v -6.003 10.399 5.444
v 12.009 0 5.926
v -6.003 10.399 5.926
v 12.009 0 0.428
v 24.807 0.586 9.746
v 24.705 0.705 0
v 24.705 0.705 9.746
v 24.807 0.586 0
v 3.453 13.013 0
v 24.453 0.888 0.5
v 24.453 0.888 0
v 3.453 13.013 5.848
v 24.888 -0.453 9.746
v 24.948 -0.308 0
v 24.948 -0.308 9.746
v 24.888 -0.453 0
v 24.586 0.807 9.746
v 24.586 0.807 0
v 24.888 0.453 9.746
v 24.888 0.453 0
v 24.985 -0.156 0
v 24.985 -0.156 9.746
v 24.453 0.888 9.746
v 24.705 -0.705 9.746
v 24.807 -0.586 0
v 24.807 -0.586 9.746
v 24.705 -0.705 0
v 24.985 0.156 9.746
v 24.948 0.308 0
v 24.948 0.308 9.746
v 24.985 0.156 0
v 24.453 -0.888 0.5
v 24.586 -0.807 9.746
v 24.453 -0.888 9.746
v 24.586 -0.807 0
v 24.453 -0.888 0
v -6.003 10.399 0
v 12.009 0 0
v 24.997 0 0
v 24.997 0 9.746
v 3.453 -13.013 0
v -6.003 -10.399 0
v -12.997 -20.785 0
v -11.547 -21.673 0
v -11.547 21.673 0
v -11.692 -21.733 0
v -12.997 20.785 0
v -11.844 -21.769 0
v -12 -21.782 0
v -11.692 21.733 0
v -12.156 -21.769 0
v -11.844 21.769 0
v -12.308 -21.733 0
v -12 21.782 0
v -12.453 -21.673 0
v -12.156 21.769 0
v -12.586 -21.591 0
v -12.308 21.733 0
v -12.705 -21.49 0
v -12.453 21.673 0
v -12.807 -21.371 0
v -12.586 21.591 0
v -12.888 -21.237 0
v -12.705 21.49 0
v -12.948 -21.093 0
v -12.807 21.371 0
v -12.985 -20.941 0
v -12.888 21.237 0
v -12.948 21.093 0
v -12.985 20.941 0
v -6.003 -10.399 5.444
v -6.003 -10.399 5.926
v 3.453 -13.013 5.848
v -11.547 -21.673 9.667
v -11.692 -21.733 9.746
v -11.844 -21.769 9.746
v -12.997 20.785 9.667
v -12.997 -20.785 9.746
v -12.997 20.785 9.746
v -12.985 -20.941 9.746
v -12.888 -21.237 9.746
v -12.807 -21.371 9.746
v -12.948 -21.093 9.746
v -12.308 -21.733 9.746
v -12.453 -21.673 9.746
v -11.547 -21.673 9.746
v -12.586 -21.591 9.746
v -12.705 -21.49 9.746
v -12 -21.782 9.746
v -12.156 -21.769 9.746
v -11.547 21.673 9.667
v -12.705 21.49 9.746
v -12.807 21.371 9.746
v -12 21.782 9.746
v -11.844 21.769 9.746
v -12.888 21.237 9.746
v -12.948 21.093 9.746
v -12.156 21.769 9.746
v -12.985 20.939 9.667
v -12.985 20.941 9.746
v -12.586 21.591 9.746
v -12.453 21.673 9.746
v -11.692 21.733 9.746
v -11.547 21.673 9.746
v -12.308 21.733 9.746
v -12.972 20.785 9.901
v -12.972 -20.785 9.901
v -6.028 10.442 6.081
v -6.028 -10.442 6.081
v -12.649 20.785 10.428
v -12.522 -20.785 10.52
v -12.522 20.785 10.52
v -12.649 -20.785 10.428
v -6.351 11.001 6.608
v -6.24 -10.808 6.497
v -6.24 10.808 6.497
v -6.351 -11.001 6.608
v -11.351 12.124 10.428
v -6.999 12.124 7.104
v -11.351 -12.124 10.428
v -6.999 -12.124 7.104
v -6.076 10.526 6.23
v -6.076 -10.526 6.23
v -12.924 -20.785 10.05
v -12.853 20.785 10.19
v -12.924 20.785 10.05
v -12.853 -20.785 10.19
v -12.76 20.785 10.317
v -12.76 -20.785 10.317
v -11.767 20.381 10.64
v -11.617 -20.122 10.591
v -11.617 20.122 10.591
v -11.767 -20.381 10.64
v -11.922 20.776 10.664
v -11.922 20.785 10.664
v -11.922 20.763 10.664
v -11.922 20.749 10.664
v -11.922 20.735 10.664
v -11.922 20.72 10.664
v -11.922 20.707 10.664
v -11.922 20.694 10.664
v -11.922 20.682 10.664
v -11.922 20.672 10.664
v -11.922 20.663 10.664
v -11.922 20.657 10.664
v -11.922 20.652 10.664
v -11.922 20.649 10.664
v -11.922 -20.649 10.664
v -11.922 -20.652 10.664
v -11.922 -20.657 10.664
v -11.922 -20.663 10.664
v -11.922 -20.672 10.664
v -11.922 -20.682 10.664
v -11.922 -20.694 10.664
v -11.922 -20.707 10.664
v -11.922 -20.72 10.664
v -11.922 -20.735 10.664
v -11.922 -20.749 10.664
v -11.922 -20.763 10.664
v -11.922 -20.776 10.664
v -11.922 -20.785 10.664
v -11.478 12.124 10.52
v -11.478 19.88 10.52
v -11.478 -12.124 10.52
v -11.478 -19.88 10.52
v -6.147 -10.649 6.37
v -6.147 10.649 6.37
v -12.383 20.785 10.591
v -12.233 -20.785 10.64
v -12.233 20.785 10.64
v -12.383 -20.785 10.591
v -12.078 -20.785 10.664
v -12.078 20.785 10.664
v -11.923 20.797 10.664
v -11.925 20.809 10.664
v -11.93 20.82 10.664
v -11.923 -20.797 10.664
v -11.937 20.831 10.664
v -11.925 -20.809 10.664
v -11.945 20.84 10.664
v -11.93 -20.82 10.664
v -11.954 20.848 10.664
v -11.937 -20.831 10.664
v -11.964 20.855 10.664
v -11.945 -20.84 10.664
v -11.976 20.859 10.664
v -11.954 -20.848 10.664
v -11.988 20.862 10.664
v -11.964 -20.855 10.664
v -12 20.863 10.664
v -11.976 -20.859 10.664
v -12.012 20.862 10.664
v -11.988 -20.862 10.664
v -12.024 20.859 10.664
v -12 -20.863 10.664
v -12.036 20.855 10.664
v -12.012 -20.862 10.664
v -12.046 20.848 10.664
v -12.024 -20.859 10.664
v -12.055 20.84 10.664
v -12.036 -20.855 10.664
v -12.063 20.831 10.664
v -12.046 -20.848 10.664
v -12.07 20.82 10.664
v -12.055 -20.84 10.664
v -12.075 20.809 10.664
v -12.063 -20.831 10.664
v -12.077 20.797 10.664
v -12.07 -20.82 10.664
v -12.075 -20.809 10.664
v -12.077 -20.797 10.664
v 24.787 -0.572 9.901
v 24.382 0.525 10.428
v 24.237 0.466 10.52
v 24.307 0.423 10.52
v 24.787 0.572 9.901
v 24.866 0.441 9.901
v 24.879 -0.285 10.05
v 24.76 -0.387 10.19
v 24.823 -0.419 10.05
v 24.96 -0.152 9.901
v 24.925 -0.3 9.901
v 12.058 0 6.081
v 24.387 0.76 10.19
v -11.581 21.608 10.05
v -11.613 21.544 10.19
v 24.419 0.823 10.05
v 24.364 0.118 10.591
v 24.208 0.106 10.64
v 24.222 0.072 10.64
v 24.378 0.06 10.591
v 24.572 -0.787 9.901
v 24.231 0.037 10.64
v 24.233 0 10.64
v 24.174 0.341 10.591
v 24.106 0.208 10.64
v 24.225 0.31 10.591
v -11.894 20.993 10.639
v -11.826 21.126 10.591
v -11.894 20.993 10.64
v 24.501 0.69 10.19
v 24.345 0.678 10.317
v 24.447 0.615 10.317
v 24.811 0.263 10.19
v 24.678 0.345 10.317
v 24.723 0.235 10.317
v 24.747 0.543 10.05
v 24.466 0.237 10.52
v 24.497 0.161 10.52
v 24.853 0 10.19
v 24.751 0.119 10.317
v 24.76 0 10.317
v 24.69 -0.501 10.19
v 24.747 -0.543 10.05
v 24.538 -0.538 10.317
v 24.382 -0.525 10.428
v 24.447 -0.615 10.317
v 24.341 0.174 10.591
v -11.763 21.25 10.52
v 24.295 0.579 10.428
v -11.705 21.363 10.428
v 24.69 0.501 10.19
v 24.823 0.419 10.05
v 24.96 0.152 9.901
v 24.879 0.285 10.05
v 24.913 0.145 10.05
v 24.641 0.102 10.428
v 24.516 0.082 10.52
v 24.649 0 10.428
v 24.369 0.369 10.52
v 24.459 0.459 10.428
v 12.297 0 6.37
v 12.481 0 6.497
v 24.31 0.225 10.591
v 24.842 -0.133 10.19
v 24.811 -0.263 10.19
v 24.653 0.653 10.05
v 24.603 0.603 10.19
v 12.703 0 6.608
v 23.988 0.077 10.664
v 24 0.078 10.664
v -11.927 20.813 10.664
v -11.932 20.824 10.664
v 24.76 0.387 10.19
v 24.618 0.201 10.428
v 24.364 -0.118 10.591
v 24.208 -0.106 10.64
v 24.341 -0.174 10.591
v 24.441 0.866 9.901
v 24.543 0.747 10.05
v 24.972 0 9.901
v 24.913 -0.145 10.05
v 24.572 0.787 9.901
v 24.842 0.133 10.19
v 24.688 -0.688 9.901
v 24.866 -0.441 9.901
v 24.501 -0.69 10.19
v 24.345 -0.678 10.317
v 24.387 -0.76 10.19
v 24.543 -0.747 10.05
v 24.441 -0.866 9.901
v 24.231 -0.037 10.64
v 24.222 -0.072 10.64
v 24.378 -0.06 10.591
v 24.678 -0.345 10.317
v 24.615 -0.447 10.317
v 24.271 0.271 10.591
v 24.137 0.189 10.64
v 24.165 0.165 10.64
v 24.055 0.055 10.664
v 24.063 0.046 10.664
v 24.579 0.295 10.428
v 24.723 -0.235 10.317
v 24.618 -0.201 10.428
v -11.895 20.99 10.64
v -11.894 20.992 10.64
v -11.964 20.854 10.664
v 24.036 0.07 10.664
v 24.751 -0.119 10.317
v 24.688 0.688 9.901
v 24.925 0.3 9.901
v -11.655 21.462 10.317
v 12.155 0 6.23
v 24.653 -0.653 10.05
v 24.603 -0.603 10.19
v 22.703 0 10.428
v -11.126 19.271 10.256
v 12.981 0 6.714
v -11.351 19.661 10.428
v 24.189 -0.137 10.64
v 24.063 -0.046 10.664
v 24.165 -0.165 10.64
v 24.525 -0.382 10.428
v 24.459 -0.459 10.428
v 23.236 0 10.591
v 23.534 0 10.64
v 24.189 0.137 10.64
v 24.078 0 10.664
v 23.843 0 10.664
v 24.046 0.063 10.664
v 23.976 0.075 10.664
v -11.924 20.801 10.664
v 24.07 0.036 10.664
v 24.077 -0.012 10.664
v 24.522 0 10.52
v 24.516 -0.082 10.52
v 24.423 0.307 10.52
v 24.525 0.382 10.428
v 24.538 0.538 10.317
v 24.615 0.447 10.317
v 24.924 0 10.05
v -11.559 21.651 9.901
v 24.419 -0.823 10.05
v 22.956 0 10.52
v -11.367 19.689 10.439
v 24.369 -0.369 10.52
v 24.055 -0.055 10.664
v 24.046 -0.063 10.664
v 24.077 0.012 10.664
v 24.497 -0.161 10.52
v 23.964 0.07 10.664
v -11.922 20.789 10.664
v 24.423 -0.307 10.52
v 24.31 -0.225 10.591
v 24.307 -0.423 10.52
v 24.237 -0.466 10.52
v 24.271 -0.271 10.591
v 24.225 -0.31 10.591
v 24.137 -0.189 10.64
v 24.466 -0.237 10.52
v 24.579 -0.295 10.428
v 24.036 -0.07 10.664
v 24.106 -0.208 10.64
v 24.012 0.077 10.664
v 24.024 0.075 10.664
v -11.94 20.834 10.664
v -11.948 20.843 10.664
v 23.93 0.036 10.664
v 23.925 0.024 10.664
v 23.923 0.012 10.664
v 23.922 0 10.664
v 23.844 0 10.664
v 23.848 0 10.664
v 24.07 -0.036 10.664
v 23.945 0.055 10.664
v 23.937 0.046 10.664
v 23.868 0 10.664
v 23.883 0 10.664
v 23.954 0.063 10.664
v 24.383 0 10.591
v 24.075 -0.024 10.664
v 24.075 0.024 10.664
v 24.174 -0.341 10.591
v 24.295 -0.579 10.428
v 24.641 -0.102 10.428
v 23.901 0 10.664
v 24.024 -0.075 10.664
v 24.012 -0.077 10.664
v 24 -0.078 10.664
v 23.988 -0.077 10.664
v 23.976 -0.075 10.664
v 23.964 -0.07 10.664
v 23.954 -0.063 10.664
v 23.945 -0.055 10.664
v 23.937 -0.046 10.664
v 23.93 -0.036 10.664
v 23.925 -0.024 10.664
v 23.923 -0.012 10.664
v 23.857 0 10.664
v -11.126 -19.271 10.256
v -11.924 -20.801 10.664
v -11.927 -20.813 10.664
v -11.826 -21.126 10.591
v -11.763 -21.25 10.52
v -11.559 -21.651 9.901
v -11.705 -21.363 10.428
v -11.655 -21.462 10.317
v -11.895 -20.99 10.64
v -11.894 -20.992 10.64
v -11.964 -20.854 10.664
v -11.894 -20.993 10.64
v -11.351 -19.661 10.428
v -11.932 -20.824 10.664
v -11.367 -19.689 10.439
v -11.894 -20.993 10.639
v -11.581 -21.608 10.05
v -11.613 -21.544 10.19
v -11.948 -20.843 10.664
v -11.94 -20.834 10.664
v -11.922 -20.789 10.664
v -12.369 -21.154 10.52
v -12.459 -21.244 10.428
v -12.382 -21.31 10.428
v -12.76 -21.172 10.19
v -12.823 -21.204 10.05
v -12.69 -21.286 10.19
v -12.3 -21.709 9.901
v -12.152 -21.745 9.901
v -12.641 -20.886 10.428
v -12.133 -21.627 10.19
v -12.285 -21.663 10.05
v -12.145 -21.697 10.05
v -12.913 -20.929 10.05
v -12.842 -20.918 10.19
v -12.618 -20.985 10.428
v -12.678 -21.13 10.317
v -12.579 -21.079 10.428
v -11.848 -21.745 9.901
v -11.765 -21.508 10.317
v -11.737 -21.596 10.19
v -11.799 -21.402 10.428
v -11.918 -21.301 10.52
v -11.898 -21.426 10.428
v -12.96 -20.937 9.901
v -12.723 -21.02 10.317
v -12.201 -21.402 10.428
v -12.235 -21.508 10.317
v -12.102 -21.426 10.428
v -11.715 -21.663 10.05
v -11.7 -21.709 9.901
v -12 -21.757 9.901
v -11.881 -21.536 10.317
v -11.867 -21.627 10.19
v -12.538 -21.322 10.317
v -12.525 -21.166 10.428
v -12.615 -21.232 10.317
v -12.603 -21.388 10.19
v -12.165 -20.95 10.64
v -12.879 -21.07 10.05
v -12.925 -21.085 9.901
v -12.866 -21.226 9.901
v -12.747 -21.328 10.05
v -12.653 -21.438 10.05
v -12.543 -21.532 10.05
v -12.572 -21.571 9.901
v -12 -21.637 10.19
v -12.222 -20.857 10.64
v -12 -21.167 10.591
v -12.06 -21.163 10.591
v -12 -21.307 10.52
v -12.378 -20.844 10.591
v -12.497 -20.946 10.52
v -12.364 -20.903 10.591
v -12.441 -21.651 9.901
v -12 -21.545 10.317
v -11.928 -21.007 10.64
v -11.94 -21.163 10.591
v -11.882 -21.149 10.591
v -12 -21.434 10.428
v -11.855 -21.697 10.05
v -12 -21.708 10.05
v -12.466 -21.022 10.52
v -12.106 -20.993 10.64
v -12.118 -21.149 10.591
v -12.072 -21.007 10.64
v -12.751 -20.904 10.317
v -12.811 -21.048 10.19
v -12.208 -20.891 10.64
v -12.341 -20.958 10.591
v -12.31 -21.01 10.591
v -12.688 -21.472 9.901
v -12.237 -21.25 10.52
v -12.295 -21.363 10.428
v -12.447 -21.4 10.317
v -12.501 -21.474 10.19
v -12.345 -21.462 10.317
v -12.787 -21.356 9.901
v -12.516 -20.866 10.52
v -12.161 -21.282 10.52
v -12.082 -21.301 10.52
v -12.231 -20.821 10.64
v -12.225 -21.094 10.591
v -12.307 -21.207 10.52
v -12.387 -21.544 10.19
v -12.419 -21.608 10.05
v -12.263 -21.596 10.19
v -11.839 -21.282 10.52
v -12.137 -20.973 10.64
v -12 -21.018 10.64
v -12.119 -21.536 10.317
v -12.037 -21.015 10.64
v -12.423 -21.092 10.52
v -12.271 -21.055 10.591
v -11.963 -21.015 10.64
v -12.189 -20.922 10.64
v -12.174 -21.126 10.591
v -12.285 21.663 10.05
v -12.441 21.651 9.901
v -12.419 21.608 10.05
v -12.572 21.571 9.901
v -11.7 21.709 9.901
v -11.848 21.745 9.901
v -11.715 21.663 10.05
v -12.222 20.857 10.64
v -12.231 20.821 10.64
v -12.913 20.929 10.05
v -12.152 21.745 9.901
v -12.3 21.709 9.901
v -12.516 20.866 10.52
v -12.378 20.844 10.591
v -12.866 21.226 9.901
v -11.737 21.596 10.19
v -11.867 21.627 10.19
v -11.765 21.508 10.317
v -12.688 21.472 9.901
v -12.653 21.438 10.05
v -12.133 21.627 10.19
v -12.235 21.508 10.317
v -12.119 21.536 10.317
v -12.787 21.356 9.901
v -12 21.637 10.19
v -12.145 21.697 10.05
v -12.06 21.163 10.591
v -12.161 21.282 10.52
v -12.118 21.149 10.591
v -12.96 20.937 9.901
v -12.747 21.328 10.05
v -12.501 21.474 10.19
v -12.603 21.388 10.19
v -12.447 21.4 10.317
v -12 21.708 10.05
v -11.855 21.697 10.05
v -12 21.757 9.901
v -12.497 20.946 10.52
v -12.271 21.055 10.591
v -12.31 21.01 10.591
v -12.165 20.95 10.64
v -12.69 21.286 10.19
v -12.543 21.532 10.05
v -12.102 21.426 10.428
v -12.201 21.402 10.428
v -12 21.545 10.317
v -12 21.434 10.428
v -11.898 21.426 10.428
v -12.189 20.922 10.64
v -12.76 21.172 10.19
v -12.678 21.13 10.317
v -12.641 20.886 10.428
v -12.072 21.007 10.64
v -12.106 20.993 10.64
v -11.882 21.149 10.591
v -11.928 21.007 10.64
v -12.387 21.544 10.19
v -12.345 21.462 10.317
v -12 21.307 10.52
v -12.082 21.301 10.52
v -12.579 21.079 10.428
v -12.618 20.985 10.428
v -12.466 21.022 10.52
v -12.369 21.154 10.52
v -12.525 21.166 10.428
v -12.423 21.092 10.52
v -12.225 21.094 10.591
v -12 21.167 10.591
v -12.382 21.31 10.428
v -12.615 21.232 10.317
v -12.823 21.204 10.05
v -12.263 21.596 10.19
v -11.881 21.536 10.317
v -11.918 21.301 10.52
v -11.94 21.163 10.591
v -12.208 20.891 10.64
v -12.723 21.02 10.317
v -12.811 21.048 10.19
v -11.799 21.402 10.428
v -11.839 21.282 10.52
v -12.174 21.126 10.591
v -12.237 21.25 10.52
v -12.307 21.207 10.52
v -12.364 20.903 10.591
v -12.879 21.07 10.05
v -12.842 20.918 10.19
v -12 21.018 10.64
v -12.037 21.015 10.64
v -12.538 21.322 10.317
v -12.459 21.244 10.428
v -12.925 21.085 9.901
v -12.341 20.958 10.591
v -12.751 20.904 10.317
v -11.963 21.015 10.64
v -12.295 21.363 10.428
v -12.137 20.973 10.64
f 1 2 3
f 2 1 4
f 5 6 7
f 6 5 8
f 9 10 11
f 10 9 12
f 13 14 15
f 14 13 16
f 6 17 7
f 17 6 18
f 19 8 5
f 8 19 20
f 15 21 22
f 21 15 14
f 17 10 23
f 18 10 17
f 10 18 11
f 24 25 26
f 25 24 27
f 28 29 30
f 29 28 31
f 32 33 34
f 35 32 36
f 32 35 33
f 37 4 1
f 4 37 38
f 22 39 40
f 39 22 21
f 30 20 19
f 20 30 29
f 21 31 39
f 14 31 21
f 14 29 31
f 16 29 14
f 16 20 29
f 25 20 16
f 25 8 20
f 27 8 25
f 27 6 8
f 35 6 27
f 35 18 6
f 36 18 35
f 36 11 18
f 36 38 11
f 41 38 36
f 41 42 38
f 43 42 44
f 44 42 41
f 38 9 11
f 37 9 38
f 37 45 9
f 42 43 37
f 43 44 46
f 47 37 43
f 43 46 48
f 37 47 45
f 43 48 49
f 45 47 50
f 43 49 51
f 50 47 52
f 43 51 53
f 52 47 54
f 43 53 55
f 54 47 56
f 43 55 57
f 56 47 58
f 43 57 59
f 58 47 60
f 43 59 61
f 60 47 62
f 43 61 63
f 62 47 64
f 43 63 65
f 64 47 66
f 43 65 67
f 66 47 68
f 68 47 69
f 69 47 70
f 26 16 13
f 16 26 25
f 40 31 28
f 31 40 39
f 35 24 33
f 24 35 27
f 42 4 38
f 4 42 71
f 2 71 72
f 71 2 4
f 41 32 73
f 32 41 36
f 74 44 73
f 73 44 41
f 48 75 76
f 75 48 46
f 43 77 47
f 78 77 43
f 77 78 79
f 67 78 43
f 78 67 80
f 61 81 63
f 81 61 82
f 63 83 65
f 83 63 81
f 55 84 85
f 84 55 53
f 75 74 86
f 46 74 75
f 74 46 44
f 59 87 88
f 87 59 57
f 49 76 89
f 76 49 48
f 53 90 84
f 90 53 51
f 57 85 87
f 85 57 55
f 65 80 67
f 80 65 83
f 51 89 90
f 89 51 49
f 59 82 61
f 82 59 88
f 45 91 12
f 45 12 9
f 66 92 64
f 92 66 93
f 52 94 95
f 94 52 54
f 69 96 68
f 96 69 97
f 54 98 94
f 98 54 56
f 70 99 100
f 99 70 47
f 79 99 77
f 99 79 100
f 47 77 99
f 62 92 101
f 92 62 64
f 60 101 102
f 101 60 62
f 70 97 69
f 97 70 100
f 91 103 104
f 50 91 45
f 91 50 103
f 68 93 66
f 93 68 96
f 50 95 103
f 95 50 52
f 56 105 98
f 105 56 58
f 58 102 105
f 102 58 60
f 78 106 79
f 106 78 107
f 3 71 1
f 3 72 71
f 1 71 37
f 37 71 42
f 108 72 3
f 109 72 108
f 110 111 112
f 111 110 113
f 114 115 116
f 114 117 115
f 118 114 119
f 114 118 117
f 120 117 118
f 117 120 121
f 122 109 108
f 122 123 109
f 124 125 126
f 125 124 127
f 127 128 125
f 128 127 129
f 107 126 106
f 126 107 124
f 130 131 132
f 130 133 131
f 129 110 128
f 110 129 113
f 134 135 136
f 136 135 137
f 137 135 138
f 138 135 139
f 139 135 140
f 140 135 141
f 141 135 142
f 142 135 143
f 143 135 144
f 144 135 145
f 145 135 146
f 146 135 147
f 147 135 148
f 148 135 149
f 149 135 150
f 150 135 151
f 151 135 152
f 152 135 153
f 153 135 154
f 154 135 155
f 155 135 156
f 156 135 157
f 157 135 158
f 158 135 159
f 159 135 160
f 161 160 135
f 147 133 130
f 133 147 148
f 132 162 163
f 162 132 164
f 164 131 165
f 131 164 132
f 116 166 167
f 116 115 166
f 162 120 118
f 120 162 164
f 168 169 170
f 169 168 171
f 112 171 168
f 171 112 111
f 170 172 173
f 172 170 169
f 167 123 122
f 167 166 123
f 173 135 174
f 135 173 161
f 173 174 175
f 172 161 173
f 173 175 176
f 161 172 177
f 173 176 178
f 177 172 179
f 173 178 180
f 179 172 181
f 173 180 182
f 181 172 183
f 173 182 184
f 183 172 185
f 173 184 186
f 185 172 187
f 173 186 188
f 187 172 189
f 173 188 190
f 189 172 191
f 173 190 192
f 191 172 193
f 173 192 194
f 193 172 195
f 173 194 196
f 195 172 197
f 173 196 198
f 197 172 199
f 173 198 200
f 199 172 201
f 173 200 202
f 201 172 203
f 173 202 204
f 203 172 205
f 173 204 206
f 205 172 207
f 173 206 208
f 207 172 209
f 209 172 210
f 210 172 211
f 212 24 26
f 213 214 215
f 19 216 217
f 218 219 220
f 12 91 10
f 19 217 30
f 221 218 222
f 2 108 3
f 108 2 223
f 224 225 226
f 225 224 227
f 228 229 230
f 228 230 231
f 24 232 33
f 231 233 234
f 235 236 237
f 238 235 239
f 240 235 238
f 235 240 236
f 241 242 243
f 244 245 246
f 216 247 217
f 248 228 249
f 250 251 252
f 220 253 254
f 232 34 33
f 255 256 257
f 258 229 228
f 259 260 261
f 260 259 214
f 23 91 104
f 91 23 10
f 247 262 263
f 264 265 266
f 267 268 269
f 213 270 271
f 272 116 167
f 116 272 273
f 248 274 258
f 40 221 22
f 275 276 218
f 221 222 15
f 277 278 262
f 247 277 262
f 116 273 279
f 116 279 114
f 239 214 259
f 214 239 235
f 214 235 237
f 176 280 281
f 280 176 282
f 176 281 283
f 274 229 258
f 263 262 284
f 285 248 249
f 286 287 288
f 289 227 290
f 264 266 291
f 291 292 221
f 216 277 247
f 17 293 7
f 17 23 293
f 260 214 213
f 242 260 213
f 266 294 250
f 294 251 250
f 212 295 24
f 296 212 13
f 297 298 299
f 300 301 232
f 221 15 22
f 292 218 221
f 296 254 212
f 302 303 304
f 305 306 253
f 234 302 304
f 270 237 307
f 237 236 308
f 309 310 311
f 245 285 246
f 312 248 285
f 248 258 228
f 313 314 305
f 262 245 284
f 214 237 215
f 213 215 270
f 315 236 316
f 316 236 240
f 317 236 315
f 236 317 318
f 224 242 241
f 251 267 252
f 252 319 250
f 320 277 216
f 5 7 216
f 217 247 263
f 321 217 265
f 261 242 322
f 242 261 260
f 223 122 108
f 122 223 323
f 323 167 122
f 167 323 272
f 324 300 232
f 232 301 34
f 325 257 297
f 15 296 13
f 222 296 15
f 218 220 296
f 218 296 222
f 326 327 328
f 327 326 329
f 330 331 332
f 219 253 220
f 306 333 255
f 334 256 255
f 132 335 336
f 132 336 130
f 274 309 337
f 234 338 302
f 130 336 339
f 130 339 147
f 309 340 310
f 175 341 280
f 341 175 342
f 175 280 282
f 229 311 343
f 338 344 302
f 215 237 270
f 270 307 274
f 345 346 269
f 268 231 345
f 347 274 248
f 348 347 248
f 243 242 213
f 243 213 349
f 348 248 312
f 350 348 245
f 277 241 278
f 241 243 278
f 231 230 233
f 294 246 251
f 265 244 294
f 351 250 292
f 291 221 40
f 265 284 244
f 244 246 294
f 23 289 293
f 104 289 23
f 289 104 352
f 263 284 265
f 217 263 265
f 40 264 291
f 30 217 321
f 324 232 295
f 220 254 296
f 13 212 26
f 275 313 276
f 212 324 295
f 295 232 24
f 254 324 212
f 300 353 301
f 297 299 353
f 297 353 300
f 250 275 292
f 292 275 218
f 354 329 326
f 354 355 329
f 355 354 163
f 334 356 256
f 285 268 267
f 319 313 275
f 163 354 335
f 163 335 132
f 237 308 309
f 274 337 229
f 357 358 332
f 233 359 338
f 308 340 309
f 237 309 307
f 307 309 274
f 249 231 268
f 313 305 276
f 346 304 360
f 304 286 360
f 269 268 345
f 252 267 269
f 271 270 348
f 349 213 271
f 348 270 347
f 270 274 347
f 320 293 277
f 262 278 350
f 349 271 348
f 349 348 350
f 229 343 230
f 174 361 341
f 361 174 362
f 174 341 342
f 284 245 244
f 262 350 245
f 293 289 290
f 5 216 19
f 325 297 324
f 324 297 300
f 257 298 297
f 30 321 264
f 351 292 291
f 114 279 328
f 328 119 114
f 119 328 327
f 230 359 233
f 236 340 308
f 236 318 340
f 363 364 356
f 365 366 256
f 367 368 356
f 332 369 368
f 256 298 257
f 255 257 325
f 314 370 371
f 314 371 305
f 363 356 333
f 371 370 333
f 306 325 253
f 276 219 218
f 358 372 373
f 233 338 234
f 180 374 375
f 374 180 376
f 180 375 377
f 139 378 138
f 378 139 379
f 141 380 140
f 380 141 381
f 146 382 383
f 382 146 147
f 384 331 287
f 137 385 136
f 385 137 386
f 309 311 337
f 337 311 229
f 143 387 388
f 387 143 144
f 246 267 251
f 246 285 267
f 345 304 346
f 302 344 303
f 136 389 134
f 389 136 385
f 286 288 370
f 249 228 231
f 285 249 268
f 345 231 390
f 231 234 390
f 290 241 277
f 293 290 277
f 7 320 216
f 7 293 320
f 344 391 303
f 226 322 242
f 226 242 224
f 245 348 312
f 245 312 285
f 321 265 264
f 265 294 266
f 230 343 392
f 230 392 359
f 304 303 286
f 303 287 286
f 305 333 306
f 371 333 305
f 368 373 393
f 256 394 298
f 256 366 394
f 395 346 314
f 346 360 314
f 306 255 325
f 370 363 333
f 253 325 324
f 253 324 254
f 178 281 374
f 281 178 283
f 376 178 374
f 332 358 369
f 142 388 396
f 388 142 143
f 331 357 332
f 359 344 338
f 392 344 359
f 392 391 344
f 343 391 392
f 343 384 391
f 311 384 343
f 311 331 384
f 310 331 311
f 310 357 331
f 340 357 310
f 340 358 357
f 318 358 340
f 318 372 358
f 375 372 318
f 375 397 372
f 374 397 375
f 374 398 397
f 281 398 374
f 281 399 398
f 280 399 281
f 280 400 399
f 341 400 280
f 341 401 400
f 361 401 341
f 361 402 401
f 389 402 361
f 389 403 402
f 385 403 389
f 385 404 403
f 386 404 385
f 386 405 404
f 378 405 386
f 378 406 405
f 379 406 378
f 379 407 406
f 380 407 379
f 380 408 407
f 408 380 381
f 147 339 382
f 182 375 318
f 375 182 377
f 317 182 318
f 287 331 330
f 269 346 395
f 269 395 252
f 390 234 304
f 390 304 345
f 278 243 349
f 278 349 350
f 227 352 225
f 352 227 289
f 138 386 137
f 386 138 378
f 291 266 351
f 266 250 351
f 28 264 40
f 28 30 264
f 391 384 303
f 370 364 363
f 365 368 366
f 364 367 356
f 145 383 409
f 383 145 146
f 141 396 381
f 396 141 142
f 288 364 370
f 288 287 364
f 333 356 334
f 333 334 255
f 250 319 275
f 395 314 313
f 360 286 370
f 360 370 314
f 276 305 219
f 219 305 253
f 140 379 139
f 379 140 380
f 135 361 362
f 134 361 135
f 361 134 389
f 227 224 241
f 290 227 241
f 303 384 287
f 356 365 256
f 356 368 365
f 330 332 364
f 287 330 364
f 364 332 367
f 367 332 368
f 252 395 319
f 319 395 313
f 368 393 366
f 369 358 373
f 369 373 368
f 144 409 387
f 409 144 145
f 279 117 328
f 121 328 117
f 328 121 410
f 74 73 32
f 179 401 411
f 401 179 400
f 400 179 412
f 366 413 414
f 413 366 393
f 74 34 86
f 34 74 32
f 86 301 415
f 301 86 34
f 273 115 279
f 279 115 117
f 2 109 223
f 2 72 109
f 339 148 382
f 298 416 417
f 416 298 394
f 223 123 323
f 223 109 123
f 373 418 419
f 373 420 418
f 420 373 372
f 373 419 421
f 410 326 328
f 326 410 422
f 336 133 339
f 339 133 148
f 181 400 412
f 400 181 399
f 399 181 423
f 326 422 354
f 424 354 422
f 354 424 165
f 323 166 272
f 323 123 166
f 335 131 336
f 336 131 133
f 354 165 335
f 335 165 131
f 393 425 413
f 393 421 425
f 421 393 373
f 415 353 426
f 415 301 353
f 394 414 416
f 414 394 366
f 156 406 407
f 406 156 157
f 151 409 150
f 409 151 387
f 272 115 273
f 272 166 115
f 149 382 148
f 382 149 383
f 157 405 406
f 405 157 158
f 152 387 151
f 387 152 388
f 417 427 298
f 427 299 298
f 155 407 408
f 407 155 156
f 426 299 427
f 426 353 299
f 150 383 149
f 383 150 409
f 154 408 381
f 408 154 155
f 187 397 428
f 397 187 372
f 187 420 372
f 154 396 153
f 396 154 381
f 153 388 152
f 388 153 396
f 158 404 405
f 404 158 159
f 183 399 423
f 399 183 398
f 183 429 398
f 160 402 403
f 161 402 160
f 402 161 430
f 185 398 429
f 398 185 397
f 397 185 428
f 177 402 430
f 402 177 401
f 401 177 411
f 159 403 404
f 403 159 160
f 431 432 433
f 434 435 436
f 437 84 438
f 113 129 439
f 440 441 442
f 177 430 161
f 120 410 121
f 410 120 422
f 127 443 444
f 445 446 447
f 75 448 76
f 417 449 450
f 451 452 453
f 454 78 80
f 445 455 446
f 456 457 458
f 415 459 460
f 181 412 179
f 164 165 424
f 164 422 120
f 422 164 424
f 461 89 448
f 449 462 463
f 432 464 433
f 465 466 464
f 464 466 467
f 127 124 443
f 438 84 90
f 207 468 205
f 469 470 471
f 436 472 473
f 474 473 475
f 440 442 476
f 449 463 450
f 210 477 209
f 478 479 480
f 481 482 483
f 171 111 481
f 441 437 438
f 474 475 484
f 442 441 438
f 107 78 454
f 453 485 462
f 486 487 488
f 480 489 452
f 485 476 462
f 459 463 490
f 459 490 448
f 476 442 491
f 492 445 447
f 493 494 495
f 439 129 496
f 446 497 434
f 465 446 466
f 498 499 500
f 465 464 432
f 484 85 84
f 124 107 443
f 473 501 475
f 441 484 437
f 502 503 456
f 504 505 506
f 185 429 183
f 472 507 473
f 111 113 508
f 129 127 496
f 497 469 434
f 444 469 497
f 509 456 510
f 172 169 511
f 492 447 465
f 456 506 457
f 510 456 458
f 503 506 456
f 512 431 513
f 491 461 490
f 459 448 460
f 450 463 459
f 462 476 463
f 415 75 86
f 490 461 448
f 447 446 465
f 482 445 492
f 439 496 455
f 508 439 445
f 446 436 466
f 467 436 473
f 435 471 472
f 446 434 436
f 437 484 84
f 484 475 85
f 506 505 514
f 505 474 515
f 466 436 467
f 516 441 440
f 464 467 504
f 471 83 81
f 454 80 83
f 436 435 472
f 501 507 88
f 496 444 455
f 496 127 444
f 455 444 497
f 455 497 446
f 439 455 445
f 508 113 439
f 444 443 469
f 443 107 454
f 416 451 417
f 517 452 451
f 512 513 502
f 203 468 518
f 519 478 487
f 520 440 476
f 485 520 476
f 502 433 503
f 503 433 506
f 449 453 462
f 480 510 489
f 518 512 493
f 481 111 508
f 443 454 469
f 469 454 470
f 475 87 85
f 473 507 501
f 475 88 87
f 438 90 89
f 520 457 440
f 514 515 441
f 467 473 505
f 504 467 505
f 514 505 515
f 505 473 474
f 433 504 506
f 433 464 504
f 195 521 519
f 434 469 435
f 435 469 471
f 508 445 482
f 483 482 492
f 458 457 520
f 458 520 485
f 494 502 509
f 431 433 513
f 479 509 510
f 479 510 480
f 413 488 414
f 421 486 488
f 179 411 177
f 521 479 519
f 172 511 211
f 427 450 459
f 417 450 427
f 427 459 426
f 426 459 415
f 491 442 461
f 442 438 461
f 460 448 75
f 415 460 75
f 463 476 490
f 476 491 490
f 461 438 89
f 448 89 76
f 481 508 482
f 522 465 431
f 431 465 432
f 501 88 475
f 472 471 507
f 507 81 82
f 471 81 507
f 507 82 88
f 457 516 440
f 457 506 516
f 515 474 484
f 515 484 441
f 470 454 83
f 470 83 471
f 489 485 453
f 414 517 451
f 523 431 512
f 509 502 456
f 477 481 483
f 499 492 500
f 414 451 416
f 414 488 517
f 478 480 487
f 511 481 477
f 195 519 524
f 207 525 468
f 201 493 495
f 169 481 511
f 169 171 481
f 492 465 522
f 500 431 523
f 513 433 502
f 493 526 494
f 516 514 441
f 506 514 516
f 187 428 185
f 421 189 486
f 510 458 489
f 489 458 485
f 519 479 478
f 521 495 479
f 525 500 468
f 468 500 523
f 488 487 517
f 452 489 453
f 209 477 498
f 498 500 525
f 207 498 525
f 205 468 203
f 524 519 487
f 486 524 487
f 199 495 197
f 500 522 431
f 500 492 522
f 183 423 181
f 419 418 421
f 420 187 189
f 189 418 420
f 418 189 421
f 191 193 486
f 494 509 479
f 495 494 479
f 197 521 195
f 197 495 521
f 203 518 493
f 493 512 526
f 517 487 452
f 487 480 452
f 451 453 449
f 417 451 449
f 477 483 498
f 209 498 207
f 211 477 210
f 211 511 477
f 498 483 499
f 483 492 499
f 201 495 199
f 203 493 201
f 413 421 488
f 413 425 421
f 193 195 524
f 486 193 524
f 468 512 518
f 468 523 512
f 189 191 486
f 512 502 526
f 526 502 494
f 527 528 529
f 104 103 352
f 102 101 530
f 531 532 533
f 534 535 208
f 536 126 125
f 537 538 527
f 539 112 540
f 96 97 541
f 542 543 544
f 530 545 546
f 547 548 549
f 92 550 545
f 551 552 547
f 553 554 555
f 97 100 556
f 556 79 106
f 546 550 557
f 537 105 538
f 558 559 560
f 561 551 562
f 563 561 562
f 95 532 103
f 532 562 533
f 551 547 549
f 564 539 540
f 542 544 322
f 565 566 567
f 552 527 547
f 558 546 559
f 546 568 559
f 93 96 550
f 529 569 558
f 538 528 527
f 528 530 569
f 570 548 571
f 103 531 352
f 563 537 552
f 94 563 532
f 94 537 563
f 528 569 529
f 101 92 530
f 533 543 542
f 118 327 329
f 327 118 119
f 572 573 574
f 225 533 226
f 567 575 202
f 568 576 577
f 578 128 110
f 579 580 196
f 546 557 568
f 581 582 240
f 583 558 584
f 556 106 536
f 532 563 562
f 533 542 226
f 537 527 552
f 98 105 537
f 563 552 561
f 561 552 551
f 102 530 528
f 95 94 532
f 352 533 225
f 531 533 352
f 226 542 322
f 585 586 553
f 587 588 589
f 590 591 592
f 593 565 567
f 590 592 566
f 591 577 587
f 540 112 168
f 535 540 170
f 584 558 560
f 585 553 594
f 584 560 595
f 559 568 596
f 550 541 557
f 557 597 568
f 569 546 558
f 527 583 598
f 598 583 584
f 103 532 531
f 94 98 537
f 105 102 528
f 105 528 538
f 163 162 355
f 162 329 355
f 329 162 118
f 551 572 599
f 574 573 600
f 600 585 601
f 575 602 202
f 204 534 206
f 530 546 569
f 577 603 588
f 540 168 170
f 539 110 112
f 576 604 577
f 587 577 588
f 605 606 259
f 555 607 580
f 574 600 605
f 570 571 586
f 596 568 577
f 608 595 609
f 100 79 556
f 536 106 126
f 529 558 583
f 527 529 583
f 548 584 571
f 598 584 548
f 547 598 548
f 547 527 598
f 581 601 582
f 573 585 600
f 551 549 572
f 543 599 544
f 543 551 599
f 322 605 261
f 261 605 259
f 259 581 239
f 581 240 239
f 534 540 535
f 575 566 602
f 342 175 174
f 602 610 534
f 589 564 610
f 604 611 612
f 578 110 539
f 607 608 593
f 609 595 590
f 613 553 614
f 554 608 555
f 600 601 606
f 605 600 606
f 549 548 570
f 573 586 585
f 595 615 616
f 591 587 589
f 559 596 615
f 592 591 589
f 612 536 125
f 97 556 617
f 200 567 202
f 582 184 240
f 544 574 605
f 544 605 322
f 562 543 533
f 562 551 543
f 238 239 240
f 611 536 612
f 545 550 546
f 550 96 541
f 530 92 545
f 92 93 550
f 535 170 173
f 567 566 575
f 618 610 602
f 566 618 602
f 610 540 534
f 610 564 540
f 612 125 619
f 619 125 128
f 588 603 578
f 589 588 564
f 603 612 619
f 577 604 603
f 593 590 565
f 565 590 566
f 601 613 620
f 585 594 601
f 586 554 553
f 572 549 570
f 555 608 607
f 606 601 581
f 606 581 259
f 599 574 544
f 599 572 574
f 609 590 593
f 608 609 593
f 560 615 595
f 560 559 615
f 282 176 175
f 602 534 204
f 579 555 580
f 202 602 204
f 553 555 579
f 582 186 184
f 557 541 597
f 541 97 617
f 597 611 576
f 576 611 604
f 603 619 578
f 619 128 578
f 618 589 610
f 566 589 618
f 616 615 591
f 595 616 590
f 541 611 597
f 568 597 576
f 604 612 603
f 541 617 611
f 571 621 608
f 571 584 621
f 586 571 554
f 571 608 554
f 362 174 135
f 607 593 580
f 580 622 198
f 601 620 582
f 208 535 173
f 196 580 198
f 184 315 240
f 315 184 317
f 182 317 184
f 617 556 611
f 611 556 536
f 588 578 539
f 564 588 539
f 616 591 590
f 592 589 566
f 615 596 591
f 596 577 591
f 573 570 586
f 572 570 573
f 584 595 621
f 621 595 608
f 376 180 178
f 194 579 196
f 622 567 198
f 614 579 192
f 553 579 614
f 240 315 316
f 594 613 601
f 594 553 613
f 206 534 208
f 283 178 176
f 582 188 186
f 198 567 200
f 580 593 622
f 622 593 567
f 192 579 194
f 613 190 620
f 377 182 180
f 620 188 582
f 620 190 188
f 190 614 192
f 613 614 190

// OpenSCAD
function hypot(a, b) = sqrt(a * a + b * b);

// Chord of a pentagon with side 1.
chord = hypot(1 + cos(72), sin(72));

// Radius of triangle with side chord.
radius = chord / sqrt(3);

// Height of the slice.
height = sqrt(1 - radius * radius);

minkowski() {
    difference() {
        cylinder(r=24, h=10, $fn=3);
        cylinder(r=14, h=30, $fn=3, center=true);
        translate([0,0,0.5]) cylinder(r1=0, r2=50*radius, h=50*height, $fn=3);
    }
    intersection() {
        sphere(1, $fn=40);
        cylinder(r=1, h=2, $fn=40);
    }
}
